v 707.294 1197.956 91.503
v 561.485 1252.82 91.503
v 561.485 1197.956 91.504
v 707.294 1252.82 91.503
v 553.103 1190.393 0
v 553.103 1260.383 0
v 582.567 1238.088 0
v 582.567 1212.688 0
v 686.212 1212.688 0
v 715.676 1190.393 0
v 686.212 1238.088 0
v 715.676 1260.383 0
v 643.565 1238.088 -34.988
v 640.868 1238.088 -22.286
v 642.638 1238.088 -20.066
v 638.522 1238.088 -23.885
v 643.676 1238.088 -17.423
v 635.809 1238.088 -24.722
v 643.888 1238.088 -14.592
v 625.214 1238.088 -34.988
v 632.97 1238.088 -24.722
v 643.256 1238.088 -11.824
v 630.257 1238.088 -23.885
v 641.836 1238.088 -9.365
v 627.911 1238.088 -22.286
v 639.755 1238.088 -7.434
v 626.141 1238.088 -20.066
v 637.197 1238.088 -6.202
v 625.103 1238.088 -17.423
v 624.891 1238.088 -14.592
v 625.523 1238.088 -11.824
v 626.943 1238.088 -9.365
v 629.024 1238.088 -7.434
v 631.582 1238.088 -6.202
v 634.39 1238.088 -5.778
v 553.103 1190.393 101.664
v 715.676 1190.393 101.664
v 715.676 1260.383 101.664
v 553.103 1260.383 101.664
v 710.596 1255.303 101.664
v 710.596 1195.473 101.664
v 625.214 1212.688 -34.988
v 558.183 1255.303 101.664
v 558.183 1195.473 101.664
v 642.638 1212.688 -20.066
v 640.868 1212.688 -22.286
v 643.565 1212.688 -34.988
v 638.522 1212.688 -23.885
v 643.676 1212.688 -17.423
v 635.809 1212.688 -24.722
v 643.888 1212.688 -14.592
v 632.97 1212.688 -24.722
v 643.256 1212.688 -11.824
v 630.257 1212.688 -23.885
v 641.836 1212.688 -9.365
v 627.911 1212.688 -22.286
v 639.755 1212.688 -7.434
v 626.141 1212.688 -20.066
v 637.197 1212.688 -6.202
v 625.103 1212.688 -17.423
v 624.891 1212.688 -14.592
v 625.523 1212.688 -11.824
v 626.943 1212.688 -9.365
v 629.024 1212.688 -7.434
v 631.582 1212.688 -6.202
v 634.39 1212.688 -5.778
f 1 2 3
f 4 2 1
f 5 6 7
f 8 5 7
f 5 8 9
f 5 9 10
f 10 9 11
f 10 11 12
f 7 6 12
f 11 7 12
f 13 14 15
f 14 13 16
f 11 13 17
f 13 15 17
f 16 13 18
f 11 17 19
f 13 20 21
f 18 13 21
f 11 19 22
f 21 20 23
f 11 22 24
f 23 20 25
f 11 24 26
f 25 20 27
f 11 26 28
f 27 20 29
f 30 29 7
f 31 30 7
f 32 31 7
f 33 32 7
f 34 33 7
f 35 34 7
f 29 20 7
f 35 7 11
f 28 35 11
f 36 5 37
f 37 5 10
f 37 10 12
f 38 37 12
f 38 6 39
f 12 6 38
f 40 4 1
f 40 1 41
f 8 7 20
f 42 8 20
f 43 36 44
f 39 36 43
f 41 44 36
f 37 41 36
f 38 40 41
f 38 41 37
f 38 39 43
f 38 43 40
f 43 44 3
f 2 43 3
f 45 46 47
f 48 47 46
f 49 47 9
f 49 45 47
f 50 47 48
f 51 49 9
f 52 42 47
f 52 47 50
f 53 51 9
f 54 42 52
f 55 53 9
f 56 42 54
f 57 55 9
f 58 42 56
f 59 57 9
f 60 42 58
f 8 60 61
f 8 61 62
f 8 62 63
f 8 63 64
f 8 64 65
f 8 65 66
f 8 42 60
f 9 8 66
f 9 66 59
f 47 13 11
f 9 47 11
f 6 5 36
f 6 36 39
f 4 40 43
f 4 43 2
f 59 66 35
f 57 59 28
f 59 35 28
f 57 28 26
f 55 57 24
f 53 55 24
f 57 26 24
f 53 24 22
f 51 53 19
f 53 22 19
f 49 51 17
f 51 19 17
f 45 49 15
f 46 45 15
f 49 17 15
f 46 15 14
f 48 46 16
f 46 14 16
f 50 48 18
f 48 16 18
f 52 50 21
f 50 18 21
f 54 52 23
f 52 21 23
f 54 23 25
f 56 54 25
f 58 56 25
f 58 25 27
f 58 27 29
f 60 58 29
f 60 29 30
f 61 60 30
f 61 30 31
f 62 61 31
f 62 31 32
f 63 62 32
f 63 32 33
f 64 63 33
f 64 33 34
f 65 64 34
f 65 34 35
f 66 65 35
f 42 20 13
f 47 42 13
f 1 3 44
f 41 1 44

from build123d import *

# Parameters (mm, degrees)
SKETCH1_W           = 162.5727
SKETCH1_H           = 69.9897
BOSS_EXTRUDE1_DEPTH = 101.6635
SKETCH2_R           = 9.525
BOSS_EXTRUDE2_DEPTH = 69.9897
SKETCH3_W           = 34.9885
SKETCH3_H           = 22.29485
CUT_EXTRUDE1_DEPTH  = 1275.884686052
CUT_EXTRUDE2_DEPTH  = 27.432
CUT_EXTRUDE3_REACH  = 1269.087
CUT_EXTRUDE5_REACH  = 1269.087


with BuildPart() as part:
    # Sketch1 → Boss-Extrude1 (new body)
    with BuildSketch(Plane.XY):
        with Locations((634.389537826, 1225.388271401)):
            Rectangle(SKETCH1_W, SKETCH1_H)
    extrude(amount=BOSS_EXTRUDE1_DEPTH)

    # Sketch2 → Boss-Extrude2 (add, through all)
    with BuildSketch(Plane(origin=(0, 1260.383121401, 0), x_dir=(1, 0, 0), z_dir=(0, 1, 0))):
        Polygon((582.567187826, 0), (625.213787826, 34.9885), (643.565287826, 34.9885), (686.211887826, 0), align=None)
        with Locations(Location((634.389537826, 15.3035, 0), (0, 0, 270))):
            Circle(SKETCH2_R, mode=Mode.SUBTRACT)
    extrude(amount=-BOSS_EXTRUDE2_DEPTH)

    # Sketch3 → Cut-Extrude1 (cut, through all)
    with BuildSketch(Plane.ZY.offset(-553.103187826)):
        with Locations((-17.49425, 1201.540846401)):
            Rectangle(SKETCH3_W, SKETCH3_H)
        with Locations((-17.49425, 1249.235696401)):
            Rectangle(SKETCH3_W, SKETCH3_H)
    extrude(amount=-CUT_EXTRUDE1_DEPTH, mode=Mode.SUBTRACT)

    # Sketch5 → Cut-Extrude2 (cut, symmetric)
    with BuildSketch(Plane(origin=(0, 1225.388271401, 0), x_dir=(1, 0, 0), z_dir=(0, 1, 0))):
        Polygon((558.183187826, -101.6635), (561.485187826, -91.5035), (707.293887826, -91.5035), (710.595887826, -101.6635), align=None)
    extrude(amount=CUT_EXTRUDE2_DEPTH, both=True, mode=Mode.SUBTRACT)

    # Cut-Extrude3: up to this plane
    cut_extrude3_end = Plane(origin=(707.293887826, 1197.956271401, 91.5035), z_dir=(0.9510340687309474, 0, -0.3090860723375604))
    # Sketch6 → Cut-Extrude3 (cut, up to the surface)
    with BuildSketch(Plane.ZY.offset(-634.389537826), mode=Mode.PRIVATE) as cut_extrude3_sk1:
        Polygon((101.6635, 1255.303121401), (91.5035, 1252.820271401), (101.6635, 1252.820271401), align=None)
    cut_extrude3_tool1 = split(extrude(cut_extrude3_sk1.sketch, amount=-CUT_EXTRUDE3_REACH, mode=Mode.PRIVATE), bisect_by=cut_extrude3_end, keep=Keep.BOTH, mode=Mode.PRIVATE)
    add(cut_extrude3_tool1.solids().sort_by_distance((634.389538, 1253.647888, 98.276833))[0], mode=Mode.SUBTRACT)
    # Sketch6 → Cut-Extrude3 (cut, up to the surface)
    with BuildSketch(Plane.ZY.offset(-634.389537826), mode=Mode.PRIVATE) as cut_extrude3_sk2:
        Polygon((91.5035, 1197.956271401), (101.6635, 1195.473421401), (101.6635, 1197.956271401), align=None)
    cut_extrude3_tool2 = split(extrude(cut_extrude3_sk2.sketch, amount=-CUT_EXTRUDE3_REACH, mode=Mode.PRIVATE), bisect_by=cut_extrude3_end, keep=Keep.BOTH, mode=Mode.PRIVATE)
    add(cut_extrude3_tool2.solids().sort_by_distance((634.389538, 1197.128655, 98.276833))[0], mode=Mode.SUBTRACT)

    # Cut-Extrude5: up to this face of the body (flat: up to its plane)
    cut_extrude5_end = Plane(part.part.faces().sort_by_distance((559.834187826, 1225.388271401, 96.5835))[0])
    # Sketch8 → Cut-Extrude5 (cut, up to the picked face)
    with BuildSketch(Plane(origin=(634.389537826, 0, 0), x_dir=(0, 0, -1), z_dir=(1, 0, 0)), mode=Mode.PRIVATE) as cut_extrude5_sk1:
        Polygon((-101.6635, 1255.303121401), (-91.5035, 1252.820271401), (-91.5035, 1197.956271401), (-101.6635, 1195.473421401), align=None)
    cut_extrude5_tool1 = split(extrude(cut_extrude5_sk1.sketch, amount=-CUT_EXTRUDE5_REACH, mode=Mode.PRIVATE), bisect_by=cut_extrude5_end, keep=Keep.BOTH, mode=Mode.PRIVATE)
    add(cut_extrude5_tool1.solids().sort_by(Axis((634.389538, 1225.388271, 96.656813), (-1, 0, 0)))[0], mode=Mode.SUBTRACT)


solid = part.part
